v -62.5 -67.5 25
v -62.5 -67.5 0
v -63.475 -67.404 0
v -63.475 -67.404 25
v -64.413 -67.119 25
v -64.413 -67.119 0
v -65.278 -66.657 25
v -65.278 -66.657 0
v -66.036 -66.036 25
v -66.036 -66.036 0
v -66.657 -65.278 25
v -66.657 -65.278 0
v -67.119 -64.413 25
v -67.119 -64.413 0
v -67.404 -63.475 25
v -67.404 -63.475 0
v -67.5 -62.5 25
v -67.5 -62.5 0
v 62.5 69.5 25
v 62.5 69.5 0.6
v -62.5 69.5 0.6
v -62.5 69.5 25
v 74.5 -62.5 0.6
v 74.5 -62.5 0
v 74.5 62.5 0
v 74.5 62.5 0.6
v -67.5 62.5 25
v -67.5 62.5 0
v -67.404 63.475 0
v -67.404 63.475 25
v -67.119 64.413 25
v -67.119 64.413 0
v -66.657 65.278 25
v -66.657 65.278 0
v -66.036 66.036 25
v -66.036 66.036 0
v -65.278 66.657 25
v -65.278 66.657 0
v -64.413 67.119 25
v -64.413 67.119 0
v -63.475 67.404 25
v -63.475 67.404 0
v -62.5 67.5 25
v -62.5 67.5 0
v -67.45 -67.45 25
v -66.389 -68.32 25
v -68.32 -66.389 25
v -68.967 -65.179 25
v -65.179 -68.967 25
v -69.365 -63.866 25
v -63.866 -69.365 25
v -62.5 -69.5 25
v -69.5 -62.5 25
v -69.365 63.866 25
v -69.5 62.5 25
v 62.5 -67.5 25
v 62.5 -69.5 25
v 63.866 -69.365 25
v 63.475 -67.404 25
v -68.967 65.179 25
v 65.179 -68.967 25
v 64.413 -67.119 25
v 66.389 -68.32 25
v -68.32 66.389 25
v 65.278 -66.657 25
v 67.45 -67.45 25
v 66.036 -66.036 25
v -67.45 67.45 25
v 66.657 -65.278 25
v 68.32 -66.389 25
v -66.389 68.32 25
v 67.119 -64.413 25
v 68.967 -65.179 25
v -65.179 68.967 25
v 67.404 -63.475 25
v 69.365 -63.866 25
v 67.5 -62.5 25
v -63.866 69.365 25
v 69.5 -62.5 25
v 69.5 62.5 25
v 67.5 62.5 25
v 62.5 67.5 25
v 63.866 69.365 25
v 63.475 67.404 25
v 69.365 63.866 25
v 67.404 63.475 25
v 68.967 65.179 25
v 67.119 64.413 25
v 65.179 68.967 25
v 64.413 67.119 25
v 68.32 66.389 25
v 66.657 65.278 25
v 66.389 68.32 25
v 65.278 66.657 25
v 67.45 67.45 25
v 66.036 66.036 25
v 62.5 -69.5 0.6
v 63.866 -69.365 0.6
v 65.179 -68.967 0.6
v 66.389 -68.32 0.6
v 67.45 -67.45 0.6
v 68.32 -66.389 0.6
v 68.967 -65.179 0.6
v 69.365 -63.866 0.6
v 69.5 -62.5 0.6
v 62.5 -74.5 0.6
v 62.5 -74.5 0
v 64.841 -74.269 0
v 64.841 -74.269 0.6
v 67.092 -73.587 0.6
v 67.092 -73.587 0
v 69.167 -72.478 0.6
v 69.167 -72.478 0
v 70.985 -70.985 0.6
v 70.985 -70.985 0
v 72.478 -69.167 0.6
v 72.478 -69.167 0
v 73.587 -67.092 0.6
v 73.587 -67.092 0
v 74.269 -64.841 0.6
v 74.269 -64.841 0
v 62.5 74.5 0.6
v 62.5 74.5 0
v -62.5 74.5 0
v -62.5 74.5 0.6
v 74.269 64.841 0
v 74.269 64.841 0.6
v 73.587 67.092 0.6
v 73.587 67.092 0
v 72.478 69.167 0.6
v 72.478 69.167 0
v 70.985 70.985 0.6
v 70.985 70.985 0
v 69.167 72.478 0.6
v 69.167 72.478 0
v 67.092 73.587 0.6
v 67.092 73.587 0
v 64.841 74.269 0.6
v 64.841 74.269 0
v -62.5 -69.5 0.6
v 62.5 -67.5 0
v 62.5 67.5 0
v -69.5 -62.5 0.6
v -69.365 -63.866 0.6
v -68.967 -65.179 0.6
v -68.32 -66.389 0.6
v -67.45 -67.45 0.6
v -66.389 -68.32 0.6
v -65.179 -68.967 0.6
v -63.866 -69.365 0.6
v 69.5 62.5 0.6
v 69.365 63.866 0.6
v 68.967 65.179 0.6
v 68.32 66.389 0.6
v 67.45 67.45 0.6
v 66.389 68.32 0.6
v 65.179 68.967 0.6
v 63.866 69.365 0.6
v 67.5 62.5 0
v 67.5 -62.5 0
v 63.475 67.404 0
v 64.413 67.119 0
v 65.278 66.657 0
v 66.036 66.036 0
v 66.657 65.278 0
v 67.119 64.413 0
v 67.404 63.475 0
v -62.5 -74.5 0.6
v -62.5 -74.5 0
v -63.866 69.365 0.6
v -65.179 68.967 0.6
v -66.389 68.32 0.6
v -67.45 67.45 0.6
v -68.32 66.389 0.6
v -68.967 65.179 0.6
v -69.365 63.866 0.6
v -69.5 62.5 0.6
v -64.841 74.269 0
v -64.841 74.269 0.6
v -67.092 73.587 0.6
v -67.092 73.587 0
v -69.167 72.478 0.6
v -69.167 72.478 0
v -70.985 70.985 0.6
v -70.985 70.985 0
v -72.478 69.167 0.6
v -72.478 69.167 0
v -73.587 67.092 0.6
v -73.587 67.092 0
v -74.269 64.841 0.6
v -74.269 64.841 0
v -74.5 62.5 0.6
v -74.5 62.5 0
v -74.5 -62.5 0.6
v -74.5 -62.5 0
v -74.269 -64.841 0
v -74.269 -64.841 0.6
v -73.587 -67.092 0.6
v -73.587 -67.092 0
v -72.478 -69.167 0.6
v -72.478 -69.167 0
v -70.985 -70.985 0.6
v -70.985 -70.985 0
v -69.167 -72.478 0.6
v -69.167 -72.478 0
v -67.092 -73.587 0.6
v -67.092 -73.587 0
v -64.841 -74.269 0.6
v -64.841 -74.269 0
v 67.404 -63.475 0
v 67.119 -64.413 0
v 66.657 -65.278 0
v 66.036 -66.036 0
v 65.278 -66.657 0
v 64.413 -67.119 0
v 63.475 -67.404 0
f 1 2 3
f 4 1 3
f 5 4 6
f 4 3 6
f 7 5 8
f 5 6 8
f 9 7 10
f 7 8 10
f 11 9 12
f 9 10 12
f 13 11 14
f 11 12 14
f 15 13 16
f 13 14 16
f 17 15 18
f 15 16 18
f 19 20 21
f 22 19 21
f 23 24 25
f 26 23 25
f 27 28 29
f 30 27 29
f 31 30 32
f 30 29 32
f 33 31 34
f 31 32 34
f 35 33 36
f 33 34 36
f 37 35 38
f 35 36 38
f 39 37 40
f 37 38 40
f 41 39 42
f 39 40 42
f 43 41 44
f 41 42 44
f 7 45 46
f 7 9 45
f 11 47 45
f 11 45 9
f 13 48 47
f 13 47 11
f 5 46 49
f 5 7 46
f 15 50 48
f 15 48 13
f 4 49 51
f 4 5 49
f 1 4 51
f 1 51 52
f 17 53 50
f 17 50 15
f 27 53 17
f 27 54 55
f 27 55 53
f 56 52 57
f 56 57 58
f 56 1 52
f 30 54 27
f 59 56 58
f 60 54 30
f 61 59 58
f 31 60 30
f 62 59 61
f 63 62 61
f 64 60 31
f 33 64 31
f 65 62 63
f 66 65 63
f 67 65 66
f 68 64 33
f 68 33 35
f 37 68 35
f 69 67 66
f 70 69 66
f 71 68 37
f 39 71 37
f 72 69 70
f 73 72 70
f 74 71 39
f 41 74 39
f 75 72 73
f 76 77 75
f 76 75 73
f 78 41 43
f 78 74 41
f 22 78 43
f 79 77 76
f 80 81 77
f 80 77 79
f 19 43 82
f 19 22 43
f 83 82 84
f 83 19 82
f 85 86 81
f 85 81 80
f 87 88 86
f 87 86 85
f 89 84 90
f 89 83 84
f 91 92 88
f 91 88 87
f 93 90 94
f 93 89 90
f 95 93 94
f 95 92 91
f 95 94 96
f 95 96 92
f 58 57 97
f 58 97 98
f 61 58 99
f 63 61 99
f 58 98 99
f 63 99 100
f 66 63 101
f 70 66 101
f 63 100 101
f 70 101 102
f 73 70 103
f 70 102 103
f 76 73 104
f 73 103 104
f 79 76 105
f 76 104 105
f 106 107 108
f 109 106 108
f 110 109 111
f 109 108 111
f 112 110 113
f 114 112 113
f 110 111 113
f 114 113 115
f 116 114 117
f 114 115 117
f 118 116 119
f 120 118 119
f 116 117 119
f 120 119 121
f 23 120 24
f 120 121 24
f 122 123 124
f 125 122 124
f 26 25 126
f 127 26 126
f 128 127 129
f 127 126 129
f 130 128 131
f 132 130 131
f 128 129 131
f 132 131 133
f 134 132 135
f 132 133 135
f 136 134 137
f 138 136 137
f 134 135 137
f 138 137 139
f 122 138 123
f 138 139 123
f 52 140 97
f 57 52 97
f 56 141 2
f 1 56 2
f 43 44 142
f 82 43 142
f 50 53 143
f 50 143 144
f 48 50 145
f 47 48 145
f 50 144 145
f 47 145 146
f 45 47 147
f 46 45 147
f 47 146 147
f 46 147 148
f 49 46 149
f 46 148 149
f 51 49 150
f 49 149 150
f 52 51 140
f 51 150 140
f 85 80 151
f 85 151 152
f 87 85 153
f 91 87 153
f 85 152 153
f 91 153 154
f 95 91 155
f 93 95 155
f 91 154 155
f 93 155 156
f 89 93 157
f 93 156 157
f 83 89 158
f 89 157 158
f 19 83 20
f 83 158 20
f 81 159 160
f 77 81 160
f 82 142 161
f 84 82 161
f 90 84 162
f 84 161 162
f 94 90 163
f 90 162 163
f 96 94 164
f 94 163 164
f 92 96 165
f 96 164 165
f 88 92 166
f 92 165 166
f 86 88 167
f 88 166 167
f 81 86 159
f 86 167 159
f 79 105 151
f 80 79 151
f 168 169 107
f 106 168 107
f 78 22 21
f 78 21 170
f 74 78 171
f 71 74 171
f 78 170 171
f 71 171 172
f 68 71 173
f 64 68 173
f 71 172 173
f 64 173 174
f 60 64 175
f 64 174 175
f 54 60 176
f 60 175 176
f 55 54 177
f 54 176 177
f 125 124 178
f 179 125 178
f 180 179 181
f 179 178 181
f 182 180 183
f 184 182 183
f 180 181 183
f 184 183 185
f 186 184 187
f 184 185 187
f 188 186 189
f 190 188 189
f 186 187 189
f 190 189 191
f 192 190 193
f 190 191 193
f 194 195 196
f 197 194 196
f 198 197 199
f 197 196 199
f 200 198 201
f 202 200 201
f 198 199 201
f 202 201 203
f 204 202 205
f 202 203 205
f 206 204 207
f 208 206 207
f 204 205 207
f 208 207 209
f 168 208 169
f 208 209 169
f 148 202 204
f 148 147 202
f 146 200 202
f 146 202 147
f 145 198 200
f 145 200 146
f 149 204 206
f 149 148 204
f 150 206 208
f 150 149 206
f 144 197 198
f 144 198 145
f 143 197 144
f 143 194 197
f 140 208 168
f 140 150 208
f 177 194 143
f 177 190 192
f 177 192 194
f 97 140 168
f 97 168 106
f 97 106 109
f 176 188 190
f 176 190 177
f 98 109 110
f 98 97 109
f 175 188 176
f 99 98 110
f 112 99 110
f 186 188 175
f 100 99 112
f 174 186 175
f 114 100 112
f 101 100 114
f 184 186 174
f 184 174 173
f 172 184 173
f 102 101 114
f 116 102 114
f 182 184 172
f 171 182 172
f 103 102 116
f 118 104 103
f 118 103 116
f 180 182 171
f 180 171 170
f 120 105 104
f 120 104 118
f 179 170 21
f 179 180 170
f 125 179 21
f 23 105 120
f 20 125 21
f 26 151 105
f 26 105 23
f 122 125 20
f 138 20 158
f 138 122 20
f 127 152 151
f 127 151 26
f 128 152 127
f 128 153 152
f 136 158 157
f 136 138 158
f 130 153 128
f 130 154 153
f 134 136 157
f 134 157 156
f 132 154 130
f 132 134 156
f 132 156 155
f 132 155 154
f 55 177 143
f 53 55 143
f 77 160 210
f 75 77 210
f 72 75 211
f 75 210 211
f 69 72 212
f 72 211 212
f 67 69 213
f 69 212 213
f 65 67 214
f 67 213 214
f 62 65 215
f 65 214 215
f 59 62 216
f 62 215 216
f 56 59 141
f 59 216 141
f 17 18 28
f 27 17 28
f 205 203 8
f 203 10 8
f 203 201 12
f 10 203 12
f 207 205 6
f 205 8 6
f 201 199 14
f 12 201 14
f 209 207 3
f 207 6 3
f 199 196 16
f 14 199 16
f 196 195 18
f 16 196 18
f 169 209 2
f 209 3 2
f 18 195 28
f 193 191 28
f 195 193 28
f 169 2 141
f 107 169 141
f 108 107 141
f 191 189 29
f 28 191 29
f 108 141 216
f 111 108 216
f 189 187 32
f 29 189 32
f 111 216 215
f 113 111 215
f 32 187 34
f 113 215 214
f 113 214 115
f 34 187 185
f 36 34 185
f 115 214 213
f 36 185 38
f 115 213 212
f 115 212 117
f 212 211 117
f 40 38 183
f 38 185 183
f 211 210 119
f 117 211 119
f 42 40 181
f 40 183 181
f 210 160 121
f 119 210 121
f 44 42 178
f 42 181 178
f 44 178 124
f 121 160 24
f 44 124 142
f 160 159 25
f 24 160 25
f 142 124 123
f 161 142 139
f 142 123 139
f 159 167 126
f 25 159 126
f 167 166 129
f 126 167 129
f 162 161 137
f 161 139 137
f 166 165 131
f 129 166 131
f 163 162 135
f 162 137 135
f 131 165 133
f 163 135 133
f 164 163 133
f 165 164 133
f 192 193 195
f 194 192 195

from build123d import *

# Parameters (mm, degrees)
F1_DEPTH = 25
F2_DEPTH = 0.6


with BuildPart() as f1:
    # F0 (on Top) → F1 (new body)
    with BuildSketch(Plane.XY):
        with BuildLine():
            Line((69.5, -62.5), (69.5, 62.5))
            ThreePointArc((69.5, 62.5), (67.449747, 67.449747), (62.5, 69.5))
            Line((62.5, 69.5), (-62.5, 69.5))
            ThreePointArc((-62.5, 69.5), (-67.449747, 67.449747), (-69.5, 62.5))
            Line((-69.5, 62.5), (-69.5, -62.5))
            ThreePointArc((-69.5, -62.5), (-67.449747, -67.449747), (-62.5, -69.5))
            Line((-62.5, -69.5), (62.5, -69.5))
            ThreePointArc((62.5, -69.5), (67.449747, -67.449747), (69.5, -62.5))
        make_face()
        with BuildLine():
            Line((-62.5, 67.5), (62.5, 67.5))
            ThreePointArc((62.5, 67.5), (66.035534, 66.035534), (67.5, 62.5))
            Line((67.5, 62.5), (67.5, -62.5))
            ThreePointArc((67.5, -62.5), (66.035534, -66.035534), (62.5, -67.5))
            Line((62.5, -67.5), (-62.5, -67.5))
            ThreePointArc((-62.5, -67.5), (-66.035534, -66.035534), (-67.5, -62.5))
            Line((-67.5, -62.5), (-67.5, 62.5))
            ThreePointArc((-67.5, 62.5), (-66.035534, 66.035534), (-62.5, 67.5))
        make_face(mode=Mode.SUBTRACT)
    extrude(amount=F1_DEPTH)

    # F0 (on Top) → F2 (join)
    with BuildSketch(Plane.XY):
        with BuildLine():
            Line((74.5, -62.5), (74.5, 62.5))
            ThreePointArc((74.5, 62.5), (70.985281, 70.985281), (62.5, 74.5))
            Line((62.5, 74.5), (-62.5, 74.5))
            ThreePointArc((-62.5, 74.5), (-70.985281, 70.985281), (-74.5, 62.5))
            Line((-74.5, 62.5), (-74.5, -62.5))
            ThreePointArc((-74.5, -62.5), (-70.985281, -70.985281), (-62.5, -74.5))
            Line((-62.5, -74.5), (62.5, -74.5))
            ThreePointArc((62.5, -74.5), (70.985281, -70.985281), (74.5, -62.5))
        make_face()
        with BuildLine():
            ThreePointArc((62.5, 69.5), (67.449747, 67.449747), (69.5, 62.5))
            Line((69.5, 62.5), (69.5, -62.5))
            ThreePointArc((69.5, -62.5), (67.449747, -67.449747), (62.5, -69.5))
            Line((62.5, -69.5), (-62.5, -69.5))
            ThreePointArc((-62.5, -69.5), (-67.449747, -67.449747), (-69.5, -62.5))
            Line((-69.5, -62.5), (-69.5, 62.5))
            ThreePointArc((-69.5, 62.5), (-67.449747, 67.449747), (-62.5, 69.5))
            Line((-62.5, 69.5), (62.5, 69.5))
        make_face(mode=Mode.SUBTRACT)
    extrude(amount=F2_DEPTH)


solid = f1.part
